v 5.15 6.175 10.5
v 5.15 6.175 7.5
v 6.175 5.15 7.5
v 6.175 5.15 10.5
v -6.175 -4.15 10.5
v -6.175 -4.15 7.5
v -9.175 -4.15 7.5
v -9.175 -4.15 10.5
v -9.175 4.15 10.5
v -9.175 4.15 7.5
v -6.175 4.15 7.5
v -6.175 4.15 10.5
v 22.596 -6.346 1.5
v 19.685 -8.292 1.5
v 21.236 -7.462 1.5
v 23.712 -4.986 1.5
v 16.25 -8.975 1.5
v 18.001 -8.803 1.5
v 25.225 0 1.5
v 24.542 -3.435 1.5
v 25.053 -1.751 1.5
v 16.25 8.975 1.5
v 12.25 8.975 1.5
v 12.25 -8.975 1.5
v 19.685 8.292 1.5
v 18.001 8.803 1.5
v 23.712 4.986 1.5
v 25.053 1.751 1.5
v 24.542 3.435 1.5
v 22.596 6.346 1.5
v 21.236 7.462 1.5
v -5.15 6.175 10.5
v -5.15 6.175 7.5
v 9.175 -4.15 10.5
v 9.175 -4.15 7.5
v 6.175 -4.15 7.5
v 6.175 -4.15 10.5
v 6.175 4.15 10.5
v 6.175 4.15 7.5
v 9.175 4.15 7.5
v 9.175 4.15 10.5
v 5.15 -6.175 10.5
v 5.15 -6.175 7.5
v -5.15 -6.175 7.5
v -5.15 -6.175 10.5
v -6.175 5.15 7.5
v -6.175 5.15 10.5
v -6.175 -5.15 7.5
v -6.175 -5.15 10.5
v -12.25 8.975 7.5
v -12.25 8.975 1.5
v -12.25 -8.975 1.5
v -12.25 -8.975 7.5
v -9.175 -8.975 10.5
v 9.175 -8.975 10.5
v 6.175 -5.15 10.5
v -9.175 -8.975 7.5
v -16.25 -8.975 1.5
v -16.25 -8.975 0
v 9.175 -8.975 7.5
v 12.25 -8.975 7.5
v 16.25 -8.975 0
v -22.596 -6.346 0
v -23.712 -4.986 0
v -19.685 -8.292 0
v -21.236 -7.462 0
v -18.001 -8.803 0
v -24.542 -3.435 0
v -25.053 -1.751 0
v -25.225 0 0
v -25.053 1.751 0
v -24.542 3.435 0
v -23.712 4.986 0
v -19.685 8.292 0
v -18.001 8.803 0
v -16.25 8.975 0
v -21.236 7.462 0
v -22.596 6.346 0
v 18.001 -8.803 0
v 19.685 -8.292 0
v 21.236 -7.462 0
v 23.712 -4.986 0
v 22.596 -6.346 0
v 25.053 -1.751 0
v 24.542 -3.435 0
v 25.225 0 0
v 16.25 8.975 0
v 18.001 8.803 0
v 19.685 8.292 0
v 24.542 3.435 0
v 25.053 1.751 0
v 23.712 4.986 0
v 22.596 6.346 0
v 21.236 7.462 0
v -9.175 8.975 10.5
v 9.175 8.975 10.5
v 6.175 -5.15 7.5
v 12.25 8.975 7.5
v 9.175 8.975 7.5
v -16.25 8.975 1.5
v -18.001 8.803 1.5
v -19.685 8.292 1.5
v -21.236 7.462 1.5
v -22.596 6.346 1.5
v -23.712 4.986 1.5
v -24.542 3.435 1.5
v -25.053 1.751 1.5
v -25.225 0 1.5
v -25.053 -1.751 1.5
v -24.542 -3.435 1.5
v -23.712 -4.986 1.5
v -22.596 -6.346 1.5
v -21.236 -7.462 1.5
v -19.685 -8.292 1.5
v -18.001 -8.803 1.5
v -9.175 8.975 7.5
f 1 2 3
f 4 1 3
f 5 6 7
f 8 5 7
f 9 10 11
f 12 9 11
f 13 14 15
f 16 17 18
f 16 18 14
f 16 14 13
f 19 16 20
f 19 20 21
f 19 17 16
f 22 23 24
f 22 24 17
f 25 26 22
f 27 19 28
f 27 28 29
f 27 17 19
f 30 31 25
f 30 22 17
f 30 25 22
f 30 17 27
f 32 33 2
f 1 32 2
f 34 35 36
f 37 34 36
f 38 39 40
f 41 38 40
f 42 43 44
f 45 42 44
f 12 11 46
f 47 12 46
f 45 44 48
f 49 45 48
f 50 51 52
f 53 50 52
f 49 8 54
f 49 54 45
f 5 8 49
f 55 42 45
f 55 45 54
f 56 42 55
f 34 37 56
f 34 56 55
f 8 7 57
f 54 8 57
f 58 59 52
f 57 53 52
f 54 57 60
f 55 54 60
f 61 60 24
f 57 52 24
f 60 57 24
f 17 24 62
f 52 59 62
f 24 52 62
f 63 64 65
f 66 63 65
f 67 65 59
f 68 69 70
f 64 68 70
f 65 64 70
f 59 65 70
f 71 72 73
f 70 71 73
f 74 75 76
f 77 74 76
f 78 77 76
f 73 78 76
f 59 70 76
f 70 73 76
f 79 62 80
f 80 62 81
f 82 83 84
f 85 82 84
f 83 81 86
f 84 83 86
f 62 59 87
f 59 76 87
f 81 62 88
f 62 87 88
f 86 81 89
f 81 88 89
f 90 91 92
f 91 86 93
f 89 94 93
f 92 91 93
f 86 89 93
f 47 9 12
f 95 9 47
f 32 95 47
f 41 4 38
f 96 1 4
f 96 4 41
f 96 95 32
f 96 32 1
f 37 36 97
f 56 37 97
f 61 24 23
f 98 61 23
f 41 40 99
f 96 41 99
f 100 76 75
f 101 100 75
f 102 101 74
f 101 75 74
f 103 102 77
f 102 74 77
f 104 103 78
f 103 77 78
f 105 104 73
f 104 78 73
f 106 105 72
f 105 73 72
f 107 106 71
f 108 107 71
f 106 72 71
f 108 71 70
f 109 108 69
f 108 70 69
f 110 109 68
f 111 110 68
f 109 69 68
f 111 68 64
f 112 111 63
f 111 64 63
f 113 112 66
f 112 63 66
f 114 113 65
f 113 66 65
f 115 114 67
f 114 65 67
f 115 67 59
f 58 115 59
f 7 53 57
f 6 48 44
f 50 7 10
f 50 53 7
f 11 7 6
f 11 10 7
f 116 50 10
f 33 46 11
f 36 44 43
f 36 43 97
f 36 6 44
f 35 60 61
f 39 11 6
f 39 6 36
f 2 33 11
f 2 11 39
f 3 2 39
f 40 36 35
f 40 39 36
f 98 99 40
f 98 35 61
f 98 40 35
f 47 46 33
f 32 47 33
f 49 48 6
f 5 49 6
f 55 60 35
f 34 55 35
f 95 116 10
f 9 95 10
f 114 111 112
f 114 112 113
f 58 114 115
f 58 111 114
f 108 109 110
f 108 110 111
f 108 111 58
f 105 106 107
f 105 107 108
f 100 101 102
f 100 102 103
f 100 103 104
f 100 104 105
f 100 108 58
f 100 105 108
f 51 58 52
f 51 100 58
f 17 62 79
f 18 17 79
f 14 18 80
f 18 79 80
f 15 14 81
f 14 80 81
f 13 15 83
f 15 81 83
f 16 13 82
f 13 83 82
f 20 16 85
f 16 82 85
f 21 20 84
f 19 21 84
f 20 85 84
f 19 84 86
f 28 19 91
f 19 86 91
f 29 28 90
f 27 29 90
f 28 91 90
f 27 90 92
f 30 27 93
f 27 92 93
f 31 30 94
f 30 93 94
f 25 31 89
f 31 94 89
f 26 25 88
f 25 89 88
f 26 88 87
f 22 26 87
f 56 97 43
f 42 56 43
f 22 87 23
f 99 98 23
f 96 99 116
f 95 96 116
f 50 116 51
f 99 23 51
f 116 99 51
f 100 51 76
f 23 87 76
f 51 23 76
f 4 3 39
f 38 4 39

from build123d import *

# Parameters (mm, degrees)
F1_DEPTH = 1.5
F3_DEPTH = 6
F5_DEPTH = 3


with BuildPart() as f1:
    # F0 (on Top) → F1 (new body)
    with BuildSketch(Plane.XY):
        Polygon((16.25, 0), (0, 0), (-16.25, 0), (-16.25, -8.975), (16.25, -8.975), align=None)
        Polygon((-16.25, 0), (0, 0), (16.25, 0), (16.25, 8.975), (-16.25, 8.975), align=None)
        with BuildLine():
            Line((-16.25, -8.975), (-16.25, 0))
            Line((-16.25, 0), (-16.25, 8.975))
            ThreePointArc((-16.25, 8.975), (-25.225, 0), (-16.25, -8.975))
        make_face()
        with BuildLine():
            Line((16.25, 8.975), (16.25, 0))
            Line((16.25, 0), (16.25, -8.975))
            ThreePointArc((16.25, -8.975), (25.225, 0), (16.25, 8.975))
        make_face()
    extrude(amount=F1_DEPTH)

    # F2 (on face) → F3 (join)
    with BuildSketch(Plane.XY.offset(1.5)):
        Polygon((0, 8.975), (0, -0.99409), (0, -8.975), (12.25, -8.975), (12.25, 8.975), align=None)
        Polygon((0, -8.975), (0, -0.99409), (0, 8.975), (-12.25, 8.975), (-12.25, -8.975), align=None)
    extrude(amount=F3_DEPTH)

    # F4 (on face) → F5 (join)
    with BuildSketch(Plane.XY.offset(7.5)):
        Polygon((5.15, -6.175), (0, -6.175), (-5.15, -6.175), (-6.175, -5.15), (-6.175, -4.15), (-9.175, -4.15), (-9.175, -8.975), (9.175, -8.975), (9.175, -4.15), (6.175, -4.15), (6.175, -5.15), align=None)
        Polygon((-5.15, 6.175), (0, 6.175), (5.15, 6.175), (6.175, 5.15), (6.175, 4.15), (9.175, 4.15), (9.175, 8.975), (-9.175, 8.975), (-9.175, 4.15), (-6.175, 4.15), (-6.175, 5.15), align=None)
    extrude(amount=F5_DEPTH)


solid = f1.part
